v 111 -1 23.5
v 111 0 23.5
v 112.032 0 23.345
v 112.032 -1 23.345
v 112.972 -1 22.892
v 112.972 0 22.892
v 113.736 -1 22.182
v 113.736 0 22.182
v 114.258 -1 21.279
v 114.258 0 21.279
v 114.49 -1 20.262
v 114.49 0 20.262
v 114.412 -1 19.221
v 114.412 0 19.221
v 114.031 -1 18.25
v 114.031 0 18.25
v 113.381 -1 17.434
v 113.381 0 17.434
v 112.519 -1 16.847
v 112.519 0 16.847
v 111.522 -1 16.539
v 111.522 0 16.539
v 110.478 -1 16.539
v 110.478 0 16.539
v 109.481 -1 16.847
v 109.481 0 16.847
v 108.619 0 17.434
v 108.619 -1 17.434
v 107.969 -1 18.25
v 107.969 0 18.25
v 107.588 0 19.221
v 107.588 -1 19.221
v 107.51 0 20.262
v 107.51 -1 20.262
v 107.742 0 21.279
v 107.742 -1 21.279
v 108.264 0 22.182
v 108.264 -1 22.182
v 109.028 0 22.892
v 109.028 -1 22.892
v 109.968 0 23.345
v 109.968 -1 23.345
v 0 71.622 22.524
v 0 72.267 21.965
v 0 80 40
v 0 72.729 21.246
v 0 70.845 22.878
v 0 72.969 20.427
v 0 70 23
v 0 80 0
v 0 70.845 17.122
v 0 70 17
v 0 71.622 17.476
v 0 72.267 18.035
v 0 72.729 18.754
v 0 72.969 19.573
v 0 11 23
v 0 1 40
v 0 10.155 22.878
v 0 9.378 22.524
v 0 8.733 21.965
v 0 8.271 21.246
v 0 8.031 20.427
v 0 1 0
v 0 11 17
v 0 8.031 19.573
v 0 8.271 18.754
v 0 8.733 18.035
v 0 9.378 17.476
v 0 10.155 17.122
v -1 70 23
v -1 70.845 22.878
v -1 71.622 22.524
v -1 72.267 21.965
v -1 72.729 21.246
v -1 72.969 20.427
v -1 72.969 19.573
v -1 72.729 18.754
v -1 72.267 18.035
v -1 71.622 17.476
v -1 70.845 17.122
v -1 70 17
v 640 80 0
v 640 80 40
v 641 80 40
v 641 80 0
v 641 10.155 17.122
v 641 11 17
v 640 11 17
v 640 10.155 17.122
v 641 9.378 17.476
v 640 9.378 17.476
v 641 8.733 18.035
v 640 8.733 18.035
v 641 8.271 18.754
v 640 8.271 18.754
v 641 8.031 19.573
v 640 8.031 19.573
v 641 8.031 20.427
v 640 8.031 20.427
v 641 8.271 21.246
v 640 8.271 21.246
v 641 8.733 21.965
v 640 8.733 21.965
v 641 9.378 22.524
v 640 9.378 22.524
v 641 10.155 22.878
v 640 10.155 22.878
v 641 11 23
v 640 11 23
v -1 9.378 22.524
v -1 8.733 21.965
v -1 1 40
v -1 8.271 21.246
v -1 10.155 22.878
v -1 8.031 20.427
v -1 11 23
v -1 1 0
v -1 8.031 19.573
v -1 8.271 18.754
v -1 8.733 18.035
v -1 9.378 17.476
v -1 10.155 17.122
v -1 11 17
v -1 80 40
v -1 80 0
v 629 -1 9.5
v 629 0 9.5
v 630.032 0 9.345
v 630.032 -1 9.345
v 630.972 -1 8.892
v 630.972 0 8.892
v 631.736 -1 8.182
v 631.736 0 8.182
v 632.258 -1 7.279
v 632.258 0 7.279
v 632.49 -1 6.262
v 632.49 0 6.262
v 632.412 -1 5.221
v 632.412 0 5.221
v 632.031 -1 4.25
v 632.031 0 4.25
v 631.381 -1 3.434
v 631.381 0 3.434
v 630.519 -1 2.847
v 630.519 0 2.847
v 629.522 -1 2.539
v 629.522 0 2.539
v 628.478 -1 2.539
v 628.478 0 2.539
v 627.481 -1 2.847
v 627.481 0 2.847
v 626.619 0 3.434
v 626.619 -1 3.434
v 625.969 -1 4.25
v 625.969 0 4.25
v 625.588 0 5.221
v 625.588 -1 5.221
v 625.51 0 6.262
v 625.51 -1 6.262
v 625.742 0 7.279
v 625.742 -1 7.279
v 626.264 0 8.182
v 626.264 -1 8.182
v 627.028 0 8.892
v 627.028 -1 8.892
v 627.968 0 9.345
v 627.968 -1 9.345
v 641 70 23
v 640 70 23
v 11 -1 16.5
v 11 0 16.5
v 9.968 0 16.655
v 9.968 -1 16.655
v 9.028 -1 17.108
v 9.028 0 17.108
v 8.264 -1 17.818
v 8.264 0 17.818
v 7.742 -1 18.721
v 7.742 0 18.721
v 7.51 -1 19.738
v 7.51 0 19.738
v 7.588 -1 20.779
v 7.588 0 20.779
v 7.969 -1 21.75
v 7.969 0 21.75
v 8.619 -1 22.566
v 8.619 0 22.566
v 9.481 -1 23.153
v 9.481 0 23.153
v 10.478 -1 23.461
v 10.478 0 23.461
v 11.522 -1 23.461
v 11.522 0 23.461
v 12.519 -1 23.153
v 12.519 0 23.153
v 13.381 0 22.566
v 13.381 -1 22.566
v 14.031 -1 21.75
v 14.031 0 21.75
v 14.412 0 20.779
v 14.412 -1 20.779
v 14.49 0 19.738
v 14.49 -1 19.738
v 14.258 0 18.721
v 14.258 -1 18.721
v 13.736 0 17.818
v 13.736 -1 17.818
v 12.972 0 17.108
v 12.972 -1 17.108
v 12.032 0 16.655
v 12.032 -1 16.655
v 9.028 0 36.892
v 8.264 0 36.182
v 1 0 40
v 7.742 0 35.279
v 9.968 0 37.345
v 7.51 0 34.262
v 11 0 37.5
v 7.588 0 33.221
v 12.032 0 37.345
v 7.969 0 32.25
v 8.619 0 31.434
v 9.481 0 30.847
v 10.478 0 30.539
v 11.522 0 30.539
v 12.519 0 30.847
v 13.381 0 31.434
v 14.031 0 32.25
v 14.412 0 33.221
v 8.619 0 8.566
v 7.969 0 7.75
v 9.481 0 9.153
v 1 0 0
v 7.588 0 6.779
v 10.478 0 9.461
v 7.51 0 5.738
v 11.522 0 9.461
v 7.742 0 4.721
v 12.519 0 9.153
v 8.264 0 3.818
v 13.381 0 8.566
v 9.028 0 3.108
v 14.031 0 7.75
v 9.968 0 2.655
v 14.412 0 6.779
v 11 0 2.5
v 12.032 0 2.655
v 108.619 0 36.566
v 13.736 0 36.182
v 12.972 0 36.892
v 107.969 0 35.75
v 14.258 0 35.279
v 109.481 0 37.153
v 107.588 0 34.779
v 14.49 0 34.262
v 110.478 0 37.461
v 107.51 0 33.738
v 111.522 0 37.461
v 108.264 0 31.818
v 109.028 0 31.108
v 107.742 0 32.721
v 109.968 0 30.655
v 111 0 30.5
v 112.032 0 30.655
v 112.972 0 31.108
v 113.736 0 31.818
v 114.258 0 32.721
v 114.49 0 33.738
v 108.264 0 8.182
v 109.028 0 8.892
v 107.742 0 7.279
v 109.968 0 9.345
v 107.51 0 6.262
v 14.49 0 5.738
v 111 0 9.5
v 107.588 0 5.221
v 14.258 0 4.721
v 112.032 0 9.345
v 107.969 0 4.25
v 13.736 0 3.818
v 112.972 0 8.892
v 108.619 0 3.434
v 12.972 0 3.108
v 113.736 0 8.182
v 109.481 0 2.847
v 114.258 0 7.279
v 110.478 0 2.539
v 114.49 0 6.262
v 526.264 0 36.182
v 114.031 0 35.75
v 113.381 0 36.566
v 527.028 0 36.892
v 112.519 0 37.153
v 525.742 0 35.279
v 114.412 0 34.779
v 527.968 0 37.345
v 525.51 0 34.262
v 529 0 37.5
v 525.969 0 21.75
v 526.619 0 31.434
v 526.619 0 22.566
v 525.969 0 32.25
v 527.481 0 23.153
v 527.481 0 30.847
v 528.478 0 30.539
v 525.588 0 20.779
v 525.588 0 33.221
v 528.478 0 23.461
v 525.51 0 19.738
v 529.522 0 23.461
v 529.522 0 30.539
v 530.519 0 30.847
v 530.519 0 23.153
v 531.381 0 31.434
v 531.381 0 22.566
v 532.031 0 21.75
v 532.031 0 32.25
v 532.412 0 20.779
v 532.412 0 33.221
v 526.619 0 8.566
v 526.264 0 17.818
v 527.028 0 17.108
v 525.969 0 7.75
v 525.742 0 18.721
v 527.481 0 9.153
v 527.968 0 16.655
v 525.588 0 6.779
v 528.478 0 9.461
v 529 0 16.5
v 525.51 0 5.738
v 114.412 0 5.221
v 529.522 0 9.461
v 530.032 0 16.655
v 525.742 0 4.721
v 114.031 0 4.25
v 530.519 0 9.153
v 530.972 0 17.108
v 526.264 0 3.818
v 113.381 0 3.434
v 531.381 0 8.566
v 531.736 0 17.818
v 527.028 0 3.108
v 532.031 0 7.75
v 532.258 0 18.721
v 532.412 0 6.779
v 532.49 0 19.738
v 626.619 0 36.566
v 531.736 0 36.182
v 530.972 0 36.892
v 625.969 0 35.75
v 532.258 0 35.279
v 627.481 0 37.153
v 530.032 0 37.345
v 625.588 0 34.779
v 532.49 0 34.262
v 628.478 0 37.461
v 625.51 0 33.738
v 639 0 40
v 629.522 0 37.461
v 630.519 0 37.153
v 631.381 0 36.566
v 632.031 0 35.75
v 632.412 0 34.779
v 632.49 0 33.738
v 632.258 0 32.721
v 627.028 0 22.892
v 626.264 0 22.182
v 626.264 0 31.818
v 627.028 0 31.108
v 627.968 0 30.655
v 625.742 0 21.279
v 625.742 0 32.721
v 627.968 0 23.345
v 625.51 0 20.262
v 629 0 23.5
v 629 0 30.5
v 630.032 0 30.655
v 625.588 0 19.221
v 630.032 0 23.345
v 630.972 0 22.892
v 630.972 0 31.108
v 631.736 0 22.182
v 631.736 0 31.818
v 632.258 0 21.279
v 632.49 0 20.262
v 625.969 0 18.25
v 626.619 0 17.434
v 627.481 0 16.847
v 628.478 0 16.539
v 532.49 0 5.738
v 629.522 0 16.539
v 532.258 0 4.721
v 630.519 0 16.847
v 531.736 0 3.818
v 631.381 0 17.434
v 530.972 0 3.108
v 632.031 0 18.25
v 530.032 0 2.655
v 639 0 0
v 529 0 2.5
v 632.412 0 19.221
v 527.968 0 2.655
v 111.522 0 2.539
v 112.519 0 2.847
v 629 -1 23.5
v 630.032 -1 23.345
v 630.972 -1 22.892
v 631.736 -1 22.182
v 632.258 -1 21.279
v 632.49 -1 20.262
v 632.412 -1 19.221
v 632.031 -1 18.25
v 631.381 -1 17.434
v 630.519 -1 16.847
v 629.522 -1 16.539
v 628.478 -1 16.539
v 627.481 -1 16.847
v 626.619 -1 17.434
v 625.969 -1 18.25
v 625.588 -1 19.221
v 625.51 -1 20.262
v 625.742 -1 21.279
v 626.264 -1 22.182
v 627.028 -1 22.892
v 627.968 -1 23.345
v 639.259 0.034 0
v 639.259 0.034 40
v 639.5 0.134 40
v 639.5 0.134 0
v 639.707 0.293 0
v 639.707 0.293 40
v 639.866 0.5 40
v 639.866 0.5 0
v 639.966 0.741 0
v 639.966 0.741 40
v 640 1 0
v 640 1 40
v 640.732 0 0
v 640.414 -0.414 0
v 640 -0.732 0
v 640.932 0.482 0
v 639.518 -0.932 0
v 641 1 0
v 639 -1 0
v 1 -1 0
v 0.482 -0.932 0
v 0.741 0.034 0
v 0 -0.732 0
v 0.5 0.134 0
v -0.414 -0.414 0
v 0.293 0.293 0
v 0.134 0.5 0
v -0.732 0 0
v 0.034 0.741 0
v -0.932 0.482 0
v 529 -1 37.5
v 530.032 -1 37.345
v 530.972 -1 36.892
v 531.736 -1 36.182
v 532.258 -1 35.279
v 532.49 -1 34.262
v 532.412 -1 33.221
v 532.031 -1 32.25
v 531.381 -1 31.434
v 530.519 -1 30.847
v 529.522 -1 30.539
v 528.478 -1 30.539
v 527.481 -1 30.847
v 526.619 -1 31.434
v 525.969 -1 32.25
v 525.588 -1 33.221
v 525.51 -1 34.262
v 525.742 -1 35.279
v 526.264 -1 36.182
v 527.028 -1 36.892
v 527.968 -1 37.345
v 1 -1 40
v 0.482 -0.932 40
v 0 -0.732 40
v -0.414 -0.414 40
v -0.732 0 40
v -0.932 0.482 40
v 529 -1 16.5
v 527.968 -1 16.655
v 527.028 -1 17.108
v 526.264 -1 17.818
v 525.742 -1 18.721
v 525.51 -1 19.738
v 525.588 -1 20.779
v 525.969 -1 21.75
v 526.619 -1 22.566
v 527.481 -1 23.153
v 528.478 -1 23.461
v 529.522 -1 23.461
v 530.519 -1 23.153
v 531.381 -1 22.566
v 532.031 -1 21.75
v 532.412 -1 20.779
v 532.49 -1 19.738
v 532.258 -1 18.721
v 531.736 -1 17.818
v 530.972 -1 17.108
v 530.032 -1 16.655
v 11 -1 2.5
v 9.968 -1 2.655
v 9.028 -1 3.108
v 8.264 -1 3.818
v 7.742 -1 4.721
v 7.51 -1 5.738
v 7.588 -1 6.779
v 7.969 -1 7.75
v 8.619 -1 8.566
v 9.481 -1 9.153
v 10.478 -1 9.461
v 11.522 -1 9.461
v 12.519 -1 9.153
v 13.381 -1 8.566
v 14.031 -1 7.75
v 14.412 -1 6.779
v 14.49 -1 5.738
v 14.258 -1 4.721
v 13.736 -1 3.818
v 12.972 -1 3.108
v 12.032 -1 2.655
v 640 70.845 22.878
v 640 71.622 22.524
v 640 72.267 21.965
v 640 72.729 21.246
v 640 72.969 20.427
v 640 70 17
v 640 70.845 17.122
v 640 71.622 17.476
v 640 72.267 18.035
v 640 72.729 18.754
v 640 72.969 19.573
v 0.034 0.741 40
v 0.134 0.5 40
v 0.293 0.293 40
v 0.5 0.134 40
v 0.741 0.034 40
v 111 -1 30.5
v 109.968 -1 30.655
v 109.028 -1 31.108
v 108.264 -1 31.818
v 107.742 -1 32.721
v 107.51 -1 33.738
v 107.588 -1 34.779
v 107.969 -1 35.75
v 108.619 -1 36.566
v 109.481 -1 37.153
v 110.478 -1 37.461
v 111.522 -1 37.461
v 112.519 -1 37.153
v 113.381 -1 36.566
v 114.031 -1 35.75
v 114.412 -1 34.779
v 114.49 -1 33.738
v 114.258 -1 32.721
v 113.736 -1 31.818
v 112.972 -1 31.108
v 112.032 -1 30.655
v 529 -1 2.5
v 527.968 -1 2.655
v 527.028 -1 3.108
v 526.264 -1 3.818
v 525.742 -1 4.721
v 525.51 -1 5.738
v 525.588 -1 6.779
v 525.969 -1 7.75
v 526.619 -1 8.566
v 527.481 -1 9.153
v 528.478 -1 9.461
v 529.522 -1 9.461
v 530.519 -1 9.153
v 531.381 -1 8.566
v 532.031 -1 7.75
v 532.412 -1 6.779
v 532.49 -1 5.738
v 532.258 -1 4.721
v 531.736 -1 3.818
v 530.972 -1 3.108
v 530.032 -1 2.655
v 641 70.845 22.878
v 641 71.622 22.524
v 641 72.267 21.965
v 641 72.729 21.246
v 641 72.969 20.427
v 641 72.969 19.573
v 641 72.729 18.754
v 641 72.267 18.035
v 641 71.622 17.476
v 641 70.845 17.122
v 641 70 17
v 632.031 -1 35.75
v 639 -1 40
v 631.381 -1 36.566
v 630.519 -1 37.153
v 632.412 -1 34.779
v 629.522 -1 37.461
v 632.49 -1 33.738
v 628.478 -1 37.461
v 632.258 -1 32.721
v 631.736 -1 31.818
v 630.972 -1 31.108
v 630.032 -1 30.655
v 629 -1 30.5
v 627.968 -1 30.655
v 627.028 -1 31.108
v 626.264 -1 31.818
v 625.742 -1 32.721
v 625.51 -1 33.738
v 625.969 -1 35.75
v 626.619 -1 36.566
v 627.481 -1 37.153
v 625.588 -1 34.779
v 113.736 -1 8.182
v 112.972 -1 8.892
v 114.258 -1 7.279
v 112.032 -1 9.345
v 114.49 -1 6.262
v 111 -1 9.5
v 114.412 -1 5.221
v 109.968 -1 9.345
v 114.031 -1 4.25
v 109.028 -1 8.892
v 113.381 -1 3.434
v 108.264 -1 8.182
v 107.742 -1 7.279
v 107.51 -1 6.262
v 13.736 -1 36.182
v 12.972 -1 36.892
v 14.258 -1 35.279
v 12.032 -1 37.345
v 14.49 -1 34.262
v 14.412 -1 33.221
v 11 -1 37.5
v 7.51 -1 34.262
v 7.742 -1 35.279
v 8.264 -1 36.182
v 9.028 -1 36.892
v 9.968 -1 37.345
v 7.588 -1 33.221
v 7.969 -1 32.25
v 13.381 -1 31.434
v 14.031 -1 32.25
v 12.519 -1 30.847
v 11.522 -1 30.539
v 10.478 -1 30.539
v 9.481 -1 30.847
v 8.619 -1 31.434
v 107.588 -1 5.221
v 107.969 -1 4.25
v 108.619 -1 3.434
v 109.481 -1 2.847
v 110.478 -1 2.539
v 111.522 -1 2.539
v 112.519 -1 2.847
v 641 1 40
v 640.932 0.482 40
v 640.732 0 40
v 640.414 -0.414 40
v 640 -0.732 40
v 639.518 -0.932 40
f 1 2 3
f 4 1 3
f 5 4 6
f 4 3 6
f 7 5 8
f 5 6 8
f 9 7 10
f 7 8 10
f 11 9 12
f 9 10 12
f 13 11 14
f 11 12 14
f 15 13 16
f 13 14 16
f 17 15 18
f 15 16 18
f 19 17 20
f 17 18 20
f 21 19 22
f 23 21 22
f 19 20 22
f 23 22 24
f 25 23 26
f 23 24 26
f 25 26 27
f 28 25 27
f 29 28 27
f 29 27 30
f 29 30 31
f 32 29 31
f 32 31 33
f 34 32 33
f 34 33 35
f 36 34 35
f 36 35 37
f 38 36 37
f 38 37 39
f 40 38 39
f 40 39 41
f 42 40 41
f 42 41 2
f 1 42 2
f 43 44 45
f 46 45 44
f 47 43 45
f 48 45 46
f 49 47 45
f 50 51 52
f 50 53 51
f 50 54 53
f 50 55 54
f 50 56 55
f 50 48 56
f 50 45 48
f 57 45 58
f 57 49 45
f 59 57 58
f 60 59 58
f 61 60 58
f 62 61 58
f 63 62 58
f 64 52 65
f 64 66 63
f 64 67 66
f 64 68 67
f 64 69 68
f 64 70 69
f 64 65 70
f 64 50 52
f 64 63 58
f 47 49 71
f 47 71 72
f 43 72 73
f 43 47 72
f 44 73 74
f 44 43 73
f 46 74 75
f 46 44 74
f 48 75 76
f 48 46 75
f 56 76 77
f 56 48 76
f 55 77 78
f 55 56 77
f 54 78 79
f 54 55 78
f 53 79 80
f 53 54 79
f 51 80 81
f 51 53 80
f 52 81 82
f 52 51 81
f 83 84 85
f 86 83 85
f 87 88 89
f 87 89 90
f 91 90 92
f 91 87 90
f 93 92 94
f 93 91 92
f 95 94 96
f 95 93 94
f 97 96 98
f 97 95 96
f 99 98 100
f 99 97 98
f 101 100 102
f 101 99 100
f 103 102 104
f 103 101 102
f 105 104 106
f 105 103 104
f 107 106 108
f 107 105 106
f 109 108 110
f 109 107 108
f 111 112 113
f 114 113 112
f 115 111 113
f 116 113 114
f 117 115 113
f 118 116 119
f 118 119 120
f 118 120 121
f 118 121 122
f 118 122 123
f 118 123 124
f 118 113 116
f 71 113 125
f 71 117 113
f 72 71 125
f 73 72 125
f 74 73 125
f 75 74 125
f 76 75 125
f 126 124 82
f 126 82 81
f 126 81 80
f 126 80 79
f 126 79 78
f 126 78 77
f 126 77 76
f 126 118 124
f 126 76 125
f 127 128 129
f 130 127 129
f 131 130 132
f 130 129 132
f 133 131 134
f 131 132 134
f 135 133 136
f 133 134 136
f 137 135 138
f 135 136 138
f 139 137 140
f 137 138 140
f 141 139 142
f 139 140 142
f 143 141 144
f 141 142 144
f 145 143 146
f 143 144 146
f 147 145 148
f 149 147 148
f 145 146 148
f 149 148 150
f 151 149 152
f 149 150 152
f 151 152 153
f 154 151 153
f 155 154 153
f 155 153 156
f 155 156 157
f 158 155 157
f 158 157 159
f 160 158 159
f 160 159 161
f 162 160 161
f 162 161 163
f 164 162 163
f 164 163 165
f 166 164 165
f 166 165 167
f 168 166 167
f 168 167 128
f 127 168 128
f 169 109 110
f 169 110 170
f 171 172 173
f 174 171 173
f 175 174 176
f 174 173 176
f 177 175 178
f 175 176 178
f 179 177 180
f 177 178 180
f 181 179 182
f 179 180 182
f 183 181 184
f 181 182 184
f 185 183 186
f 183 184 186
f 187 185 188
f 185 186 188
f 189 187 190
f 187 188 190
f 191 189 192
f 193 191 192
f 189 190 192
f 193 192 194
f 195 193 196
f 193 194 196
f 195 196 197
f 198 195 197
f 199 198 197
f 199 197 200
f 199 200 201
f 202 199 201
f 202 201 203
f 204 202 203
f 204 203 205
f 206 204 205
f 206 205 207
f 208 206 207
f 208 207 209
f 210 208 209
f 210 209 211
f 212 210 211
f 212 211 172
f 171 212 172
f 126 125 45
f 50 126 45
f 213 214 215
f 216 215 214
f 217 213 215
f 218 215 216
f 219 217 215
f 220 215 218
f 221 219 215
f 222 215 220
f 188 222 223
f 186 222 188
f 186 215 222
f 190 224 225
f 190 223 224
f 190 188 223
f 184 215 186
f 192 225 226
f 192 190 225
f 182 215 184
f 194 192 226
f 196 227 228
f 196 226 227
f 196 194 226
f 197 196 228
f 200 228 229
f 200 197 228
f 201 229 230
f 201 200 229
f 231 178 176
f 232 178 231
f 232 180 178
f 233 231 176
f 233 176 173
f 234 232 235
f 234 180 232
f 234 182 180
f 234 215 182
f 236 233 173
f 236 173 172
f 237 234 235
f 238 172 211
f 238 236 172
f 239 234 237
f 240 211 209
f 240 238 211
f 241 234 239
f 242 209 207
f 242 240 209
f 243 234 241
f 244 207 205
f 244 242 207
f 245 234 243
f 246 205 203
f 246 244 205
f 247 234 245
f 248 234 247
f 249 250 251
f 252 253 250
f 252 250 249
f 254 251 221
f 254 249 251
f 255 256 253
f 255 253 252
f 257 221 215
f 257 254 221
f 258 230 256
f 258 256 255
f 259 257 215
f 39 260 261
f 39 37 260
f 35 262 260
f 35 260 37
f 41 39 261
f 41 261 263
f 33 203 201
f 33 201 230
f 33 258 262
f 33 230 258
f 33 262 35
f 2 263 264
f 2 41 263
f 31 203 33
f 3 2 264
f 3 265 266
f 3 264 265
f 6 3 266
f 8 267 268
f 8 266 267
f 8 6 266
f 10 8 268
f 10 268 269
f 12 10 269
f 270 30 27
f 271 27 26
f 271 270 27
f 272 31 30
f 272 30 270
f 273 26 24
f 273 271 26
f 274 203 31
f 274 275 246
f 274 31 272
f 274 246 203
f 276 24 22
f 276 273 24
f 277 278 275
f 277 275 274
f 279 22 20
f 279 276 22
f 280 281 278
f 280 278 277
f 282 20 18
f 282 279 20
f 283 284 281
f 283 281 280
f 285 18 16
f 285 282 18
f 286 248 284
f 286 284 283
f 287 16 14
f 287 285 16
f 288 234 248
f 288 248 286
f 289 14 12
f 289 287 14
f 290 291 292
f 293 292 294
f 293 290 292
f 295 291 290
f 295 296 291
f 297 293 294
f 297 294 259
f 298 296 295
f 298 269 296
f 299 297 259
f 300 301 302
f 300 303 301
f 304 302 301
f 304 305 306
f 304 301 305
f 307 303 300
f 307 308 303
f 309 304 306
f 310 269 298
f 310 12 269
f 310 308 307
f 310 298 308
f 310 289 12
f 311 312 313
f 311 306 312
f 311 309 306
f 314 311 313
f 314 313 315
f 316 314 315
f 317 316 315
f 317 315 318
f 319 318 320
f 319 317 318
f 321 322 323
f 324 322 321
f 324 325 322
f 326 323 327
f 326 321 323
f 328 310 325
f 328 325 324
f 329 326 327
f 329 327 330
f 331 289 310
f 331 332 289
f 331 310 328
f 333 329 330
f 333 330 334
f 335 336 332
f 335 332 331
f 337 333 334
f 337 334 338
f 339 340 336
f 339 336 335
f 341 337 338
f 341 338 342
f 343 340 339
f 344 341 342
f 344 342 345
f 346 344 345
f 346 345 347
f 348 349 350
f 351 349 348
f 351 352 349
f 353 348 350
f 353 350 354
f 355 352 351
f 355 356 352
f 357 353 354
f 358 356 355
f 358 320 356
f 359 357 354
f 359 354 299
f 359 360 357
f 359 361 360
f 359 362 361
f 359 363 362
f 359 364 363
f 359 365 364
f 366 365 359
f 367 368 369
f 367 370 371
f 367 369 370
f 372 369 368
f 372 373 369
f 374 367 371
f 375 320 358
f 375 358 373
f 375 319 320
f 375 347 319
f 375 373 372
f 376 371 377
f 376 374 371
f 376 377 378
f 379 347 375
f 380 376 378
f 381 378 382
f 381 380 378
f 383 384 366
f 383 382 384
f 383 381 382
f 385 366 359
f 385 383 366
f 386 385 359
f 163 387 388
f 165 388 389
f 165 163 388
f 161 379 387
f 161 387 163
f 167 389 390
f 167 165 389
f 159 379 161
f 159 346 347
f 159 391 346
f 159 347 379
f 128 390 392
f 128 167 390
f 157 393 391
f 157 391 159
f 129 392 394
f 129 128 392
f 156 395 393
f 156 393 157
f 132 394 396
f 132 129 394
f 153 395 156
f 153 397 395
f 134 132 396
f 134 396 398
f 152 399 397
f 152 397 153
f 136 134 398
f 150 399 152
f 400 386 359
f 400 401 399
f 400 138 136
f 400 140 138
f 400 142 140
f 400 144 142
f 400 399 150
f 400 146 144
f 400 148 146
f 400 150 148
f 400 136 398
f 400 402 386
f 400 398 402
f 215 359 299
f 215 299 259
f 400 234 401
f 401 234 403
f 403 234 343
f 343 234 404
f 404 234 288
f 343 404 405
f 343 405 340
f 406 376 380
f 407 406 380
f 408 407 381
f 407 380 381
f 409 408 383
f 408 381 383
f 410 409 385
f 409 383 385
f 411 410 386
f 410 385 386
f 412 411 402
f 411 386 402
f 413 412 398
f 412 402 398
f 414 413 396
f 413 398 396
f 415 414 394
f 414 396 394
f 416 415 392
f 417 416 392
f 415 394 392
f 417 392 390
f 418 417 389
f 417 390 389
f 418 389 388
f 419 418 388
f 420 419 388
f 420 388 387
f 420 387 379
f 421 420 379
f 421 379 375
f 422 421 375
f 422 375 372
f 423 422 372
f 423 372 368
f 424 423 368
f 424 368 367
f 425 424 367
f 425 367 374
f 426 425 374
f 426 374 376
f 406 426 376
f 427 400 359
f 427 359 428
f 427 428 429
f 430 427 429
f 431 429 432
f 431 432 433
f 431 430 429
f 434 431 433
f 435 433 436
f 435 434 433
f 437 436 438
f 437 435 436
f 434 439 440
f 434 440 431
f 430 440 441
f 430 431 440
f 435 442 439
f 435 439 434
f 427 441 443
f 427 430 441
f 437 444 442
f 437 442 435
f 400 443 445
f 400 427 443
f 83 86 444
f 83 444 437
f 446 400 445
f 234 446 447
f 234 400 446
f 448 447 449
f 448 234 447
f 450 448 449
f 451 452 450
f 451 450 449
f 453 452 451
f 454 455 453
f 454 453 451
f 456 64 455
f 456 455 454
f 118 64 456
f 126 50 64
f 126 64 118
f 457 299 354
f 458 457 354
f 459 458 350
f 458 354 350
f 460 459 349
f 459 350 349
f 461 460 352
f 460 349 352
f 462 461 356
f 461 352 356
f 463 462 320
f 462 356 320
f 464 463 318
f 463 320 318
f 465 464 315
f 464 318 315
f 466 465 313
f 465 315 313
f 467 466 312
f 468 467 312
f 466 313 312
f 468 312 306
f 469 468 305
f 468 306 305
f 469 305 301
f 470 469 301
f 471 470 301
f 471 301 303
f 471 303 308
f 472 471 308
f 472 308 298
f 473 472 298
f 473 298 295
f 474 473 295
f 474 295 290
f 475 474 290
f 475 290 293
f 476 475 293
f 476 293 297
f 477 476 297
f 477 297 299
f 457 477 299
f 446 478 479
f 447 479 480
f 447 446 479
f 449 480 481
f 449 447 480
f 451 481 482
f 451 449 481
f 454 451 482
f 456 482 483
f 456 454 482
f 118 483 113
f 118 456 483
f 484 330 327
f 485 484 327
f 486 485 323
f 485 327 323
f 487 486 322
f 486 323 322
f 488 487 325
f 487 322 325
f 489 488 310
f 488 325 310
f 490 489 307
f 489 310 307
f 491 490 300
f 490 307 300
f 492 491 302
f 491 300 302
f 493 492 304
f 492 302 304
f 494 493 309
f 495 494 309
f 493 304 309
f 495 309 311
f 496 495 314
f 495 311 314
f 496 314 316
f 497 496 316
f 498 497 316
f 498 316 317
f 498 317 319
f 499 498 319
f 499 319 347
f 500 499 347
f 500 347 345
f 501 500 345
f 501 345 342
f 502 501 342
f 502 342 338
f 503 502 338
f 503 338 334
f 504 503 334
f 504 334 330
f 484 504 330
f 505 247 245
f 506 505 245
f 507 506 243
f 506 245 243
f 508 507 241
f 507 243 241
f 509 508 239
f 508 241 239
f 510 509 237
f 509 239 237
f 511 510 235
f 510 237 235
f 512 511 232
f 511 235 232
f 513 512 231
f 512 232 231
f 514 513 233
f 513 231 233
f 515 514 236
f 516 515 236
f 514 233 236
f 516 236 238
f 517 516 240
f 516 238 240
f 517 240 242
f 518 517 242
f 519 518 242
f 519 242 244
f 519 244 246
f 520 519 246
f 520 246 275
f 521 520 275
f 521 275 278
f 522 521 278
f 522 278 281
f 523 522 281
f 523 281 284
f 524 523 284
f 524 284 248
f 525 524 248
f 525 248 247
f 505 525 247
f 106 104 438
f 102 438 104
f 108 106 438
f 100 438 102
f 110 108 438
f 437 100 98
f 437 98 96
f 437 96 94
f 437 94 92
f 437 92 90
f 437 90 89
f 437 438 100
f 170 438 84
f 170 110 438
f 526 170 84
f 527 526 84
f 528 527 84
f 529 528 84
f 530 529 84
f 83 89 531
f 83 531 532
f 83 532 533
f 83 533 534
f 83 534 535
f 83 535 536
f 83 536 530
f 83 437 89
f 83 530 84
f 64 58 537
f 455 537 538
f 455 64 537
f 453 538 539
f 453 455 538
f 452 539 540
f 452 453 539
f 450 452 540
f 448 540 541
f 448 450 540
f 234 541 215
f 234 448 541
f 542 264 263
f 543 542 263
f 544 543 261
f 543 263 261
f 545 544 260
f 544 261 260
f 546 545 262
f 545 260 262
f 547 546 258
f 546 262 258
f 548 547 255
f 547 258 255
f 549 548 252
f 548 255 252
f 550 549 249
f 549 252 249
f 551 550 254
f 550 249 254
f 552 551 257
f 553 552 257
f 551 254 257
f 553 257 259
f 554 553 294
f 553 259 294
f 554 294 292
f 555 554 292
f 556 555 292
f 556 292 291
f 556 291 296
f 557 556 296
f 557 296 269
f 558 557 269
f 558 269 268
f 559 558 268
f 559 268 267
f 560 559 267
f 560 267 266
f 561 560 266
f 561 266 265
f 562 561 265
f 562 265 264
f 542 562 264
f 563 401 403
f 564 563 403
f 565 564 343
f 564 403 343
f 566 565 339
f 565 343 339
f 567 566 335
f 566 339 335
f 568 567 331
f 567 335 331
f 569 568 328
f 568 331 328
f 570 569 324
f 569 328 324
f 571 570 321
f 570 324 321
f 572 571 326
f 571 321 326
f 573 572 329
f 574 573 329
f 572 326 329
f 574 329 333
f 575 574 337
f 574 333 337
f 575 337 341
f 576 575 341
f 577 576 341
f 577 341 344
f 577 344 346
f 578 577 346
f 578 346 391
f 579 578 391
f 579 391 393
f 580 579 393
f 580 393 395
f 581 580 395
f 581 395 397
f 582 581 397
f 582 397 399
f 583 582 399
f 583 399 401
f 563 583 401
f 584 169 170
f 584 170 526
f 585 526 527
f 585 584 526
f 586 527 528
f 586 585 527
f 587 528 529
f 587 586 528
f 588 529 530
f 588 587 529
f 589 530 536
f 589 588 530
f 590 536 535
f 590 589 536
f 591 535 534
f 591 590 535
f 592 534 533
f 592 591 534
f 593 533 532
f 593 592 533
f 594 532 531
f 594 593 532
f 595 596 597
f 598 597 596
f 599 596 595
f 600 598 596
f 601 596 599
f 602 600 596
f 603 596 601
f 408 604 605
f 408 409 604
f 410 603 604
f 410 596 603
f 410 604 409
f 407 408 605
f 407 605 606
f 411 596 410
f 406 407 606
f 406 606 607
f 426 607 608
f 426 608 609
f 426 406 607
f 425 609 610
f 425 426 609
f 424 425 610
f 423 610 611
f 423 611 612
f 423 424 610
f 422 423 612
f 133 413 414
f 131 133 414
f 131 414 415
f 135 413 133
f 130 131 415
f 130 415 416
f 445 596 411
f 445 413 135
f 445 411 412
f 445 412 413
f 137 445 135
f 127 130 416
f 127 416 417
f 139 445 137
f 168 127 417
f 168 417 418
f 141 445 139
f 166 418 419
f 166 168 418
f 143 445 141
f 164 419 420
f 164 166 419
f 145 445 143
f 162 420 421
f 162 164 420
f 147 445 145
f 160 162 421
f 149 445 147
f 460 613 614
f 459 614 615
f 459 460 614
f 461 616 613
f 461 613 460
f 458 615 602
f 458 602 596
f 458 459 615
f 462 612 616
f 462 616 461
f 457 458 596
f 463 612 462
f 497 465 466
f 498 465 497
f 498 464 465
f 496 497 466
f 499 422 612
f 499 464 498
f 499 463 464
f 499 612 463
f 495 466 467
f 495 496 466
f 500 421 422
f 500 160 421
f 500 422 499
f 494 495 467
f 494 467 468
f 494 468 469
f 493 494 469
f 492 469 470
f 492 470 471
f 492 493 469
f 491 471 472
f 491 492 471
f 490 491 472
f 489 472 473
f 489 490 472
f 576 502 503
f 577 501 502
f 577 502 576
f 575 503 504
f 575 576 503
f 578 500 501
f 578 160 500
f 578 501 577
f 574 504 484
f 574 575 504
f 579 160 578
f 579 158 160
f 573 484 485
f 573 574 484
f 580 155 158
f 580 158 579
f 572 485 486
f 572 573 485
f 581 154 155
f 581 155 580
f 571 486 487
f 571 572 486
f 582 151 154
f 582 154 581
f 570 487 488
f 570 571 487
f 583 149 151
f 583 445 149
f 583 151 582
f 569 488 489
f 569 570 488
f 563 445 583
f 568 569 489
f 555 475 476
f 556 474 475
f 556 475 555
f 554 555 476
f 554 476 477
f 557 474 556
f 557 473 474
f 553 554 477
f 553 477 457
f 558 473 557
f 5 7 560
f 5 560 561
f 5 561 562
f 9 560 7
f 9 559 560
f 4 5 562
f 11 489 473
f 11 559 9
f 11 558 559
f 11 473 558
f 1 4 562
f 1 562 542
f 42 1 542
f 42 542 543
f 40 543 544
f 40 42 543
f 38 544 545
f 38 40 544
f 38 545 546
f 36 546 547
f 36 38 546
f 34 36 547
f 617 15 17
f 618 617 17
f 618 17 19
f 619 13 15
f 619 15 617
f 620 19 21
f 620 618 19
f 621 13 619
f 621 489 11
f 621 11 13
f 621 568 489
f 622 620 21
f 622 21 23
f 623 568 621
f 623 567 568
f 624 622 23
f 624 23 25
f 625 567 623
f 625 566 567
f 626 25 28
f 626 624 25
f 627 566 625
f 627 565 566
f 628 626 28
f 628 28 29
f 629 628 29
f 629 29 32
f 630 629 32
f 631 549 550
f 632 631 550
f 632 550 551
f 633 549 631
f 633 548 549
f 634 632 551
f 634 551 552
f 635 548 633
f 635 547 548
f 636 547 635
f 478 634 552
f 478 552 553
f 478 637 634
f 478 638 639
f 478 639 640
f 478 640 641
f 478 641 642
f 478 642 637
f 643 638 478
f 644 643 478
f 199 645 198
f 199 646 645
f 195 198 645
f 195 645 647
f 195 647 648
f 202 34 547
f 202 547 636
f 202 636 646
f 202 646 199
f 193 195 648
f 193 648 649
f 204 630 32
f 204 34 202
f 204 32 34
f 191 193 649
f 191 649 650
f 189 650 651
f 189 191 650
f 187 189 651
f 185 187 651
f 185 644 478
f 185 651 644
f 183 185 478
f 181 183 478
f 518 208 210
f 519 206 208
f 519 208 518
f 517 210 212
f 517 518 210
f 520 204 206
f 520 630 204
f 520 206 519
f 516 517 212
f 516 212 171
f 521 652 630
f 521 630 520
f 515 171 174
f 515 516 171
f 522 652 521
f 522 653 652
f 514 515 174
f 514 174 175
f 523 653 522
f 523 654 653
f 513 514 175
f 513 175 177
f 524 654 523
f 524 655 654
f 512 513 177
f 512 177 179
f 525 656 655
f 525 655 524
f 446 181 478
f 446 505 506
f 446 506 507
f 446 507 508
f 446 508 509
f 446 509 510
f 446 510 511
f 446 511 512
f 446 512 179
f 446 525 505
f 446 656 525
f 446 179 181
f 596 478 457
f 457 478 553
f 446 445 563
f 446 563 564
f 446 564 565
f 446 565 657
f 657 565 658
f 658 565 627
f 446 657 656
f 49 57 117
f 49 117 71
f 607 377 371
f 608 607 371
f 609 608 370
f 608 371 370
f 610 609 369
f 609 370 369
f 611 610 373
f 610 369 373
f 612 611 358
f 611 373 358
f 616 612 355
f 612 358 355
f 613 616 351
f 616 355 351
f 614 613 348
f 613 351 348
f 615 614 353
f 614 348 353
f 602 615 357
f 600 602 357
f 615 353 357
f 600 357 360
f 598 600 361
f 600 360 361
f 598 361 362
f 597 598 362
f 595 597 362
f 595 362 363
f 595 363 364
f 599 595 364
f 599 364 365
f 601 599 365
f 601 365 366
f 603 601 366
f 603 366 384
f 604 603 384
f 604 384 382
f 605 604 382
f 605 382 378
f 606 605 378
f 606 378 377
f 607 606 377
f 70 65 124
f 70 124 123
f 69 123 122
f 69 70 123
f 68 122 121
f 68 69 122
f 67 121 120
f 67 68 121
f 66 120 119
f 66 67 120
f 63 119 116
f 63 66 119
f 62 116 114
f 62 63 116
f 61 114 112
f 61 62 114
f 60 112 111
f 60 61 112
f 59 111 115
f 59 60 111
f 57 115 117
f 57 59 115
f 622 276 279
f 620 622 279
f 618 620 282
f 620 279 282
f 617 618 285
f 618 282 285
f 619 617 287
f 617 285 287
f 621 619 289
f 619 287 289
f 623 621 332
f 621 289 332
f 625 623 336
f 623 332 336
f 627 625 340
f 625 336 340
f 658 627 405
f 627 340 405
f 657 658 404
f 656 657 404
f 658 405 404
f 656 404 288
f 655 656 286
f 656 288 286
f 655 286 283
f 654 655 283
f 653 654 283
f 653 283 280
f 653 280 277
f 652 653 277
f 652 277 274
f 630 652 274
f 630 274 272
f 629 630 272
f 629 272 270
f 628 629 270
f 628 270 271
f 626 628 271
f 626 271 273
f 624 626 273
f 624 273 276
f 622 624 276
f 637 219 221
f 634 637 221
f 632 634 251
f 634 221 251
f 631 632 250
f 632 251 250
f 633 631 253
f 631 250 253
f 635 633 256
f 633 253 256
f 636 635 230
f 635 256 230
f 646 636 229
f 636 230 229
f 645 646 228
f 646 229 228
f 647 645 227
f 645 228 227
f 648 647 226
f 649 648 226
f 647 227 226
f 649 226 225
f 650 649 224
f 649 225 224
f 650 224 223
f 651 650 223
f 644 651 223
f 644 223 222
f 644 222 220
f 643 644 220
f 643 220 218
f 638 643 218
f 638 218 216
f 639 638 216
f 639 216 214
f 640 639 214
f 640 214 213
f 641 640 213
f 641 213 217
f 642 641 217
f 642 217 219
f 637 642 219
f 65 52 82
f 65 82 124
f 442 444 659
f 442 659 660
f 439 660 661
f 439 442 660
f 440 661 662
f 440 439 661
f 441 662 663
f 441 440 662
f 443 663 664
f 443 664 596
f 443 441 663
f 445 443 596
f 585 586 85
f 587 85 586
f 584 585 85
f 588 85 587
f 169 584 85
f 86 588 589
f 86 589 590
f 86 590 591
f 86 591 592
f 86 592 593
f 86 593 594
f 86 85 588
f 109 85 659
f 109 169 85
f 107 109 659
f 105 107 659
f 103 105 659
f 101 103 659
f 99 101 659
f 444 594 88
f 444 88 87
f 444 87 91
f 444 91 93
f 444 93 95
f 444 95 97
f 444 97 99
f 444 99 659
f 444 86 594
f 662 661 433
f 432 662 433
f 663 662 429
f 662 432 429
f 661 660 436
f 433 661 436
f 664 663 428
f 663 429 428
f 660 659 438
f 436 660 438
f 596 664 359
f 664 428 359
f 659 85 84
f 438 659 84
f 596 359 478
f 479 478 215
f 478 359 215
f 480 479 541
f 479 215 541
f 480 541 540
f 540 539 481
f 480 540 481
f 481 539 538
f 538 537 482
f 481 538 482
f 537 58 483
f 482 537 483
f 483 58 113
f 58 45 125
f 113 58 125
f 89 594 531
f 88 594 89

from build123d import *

# Parameters (mm, degrees)
BASE_FLANGE1_DEPTH = 40
CUT_EXTRUDE1_DEPTH = 649.200586239
SKETCH7_R          = 3.5
CUT_EXTRUDE2_DEPTH = 648.210166793


# Sheet-metal steps are written as plain solids
with BuildPart() as part:
    # Sketch1 → Base-Flange1 (new body)
    with BuildSketch(Plane.XY):
        with BuildLine():
            Line((0, 80), (0, 1))
            ThreePointArc((0, 1), (0.292893219, 0.292893219), (1, 0))
            Line((1, 0), (639, 0))
            ThreePointArc((639, 0), (639.707106781, 0.292893219), (640, 1))
            Line((640, 1), (640, 80))
            Line((640, 80), (641, 80))
            Line((641, 80), (641, 1))
            ThreePointArc((641, 1), (640.414213562, -0.414213562), (639, -1))
            Line((639, -1), (1, -1))
            ThreePointArc((1, -1), (-0.414213562, -0.414213562), (-1, 1))
            Line((-1, 1), (-1, 80))
            Line((-1, 80), (0, 80))
        make_face()
    extrude(amount=BASE_FLANGE1_DEPTH)

    # Sketch6 → Cut-Extrude1 (cut, through all)
    with BuildSketch(Plane(origin=(641, 0, 0), x_dir=(0, 0, -1), z_dir=(1, 0, 0))):
        with BuildLine():
            Line((-17, 70), (-17, 11))
            ThreePointArc((-17, 11), (-20, 8), (-23, 11))
            Line((-23, 11), (-23, 70))
            ThreePointArc((-23, 70), (-20, 73), (-17, 70))
        make_face()
    extrude(amount=-CUT_EXTRUDE1_DEPTH, mode=Mode.SUBTRACT)

    # Sketch7 → Cut-Extrude2 (cut, through all)
    with BuildSketch(Plane(origin=(0, 0, 0), x_dir=(1, 0, 0), z_dir=(0, 1, 0))):
        with Locations(Location((629, -20, 0), (0, 0, 270))):
            Circle(SKETCH7_R)
        with Locations(Location((629, -6, 0), (0, 0, 270))):
            Circle(SKETCH7_R)
        with Locations(Location((11, -20, 0), (0, 0, 90))):
            Circle(SKETCH7_R)
        with Locations(Location((11, -6, 0), (0, 0, 90))):
            Circle(SKETCH7_R)
        with Locations(Location((11, -34, 0), (0, 0, 270))):
            Circle(SKETCH7_R)
        with Locations(Location((629, -34, 0), (0, 0, 90))):
            Circle(SKETCH7_R)
        with Locations(Location((111, -34, 0), (0, 0, 90))):
            Circle(SKETCH7_R)
        with Locations(Location((111, -20, 0), (0, 0, 270))):
            Circle(SKETCH7_R)
        with Locations(Location((111, -6, 0), (0, 0, 270))):
            Circle(SKETCH7_R)
        with Locations(Location((529, -20, 0), (0, 0, 90))):
            Circle(SKETCH7_R)
        with Locations(Location((529, -34, 0), (0, 0, 270))):
            Circle(SKETCH7_R)
        with Locations(Location((529, -6, 0), (0, 0, 90))):
            Circle(SKETCH7_R)
    extrude(amount=-CUT_EXTRUDE2_DEPTH, mode=Mode.SUBTRACT)


solid = part.part
